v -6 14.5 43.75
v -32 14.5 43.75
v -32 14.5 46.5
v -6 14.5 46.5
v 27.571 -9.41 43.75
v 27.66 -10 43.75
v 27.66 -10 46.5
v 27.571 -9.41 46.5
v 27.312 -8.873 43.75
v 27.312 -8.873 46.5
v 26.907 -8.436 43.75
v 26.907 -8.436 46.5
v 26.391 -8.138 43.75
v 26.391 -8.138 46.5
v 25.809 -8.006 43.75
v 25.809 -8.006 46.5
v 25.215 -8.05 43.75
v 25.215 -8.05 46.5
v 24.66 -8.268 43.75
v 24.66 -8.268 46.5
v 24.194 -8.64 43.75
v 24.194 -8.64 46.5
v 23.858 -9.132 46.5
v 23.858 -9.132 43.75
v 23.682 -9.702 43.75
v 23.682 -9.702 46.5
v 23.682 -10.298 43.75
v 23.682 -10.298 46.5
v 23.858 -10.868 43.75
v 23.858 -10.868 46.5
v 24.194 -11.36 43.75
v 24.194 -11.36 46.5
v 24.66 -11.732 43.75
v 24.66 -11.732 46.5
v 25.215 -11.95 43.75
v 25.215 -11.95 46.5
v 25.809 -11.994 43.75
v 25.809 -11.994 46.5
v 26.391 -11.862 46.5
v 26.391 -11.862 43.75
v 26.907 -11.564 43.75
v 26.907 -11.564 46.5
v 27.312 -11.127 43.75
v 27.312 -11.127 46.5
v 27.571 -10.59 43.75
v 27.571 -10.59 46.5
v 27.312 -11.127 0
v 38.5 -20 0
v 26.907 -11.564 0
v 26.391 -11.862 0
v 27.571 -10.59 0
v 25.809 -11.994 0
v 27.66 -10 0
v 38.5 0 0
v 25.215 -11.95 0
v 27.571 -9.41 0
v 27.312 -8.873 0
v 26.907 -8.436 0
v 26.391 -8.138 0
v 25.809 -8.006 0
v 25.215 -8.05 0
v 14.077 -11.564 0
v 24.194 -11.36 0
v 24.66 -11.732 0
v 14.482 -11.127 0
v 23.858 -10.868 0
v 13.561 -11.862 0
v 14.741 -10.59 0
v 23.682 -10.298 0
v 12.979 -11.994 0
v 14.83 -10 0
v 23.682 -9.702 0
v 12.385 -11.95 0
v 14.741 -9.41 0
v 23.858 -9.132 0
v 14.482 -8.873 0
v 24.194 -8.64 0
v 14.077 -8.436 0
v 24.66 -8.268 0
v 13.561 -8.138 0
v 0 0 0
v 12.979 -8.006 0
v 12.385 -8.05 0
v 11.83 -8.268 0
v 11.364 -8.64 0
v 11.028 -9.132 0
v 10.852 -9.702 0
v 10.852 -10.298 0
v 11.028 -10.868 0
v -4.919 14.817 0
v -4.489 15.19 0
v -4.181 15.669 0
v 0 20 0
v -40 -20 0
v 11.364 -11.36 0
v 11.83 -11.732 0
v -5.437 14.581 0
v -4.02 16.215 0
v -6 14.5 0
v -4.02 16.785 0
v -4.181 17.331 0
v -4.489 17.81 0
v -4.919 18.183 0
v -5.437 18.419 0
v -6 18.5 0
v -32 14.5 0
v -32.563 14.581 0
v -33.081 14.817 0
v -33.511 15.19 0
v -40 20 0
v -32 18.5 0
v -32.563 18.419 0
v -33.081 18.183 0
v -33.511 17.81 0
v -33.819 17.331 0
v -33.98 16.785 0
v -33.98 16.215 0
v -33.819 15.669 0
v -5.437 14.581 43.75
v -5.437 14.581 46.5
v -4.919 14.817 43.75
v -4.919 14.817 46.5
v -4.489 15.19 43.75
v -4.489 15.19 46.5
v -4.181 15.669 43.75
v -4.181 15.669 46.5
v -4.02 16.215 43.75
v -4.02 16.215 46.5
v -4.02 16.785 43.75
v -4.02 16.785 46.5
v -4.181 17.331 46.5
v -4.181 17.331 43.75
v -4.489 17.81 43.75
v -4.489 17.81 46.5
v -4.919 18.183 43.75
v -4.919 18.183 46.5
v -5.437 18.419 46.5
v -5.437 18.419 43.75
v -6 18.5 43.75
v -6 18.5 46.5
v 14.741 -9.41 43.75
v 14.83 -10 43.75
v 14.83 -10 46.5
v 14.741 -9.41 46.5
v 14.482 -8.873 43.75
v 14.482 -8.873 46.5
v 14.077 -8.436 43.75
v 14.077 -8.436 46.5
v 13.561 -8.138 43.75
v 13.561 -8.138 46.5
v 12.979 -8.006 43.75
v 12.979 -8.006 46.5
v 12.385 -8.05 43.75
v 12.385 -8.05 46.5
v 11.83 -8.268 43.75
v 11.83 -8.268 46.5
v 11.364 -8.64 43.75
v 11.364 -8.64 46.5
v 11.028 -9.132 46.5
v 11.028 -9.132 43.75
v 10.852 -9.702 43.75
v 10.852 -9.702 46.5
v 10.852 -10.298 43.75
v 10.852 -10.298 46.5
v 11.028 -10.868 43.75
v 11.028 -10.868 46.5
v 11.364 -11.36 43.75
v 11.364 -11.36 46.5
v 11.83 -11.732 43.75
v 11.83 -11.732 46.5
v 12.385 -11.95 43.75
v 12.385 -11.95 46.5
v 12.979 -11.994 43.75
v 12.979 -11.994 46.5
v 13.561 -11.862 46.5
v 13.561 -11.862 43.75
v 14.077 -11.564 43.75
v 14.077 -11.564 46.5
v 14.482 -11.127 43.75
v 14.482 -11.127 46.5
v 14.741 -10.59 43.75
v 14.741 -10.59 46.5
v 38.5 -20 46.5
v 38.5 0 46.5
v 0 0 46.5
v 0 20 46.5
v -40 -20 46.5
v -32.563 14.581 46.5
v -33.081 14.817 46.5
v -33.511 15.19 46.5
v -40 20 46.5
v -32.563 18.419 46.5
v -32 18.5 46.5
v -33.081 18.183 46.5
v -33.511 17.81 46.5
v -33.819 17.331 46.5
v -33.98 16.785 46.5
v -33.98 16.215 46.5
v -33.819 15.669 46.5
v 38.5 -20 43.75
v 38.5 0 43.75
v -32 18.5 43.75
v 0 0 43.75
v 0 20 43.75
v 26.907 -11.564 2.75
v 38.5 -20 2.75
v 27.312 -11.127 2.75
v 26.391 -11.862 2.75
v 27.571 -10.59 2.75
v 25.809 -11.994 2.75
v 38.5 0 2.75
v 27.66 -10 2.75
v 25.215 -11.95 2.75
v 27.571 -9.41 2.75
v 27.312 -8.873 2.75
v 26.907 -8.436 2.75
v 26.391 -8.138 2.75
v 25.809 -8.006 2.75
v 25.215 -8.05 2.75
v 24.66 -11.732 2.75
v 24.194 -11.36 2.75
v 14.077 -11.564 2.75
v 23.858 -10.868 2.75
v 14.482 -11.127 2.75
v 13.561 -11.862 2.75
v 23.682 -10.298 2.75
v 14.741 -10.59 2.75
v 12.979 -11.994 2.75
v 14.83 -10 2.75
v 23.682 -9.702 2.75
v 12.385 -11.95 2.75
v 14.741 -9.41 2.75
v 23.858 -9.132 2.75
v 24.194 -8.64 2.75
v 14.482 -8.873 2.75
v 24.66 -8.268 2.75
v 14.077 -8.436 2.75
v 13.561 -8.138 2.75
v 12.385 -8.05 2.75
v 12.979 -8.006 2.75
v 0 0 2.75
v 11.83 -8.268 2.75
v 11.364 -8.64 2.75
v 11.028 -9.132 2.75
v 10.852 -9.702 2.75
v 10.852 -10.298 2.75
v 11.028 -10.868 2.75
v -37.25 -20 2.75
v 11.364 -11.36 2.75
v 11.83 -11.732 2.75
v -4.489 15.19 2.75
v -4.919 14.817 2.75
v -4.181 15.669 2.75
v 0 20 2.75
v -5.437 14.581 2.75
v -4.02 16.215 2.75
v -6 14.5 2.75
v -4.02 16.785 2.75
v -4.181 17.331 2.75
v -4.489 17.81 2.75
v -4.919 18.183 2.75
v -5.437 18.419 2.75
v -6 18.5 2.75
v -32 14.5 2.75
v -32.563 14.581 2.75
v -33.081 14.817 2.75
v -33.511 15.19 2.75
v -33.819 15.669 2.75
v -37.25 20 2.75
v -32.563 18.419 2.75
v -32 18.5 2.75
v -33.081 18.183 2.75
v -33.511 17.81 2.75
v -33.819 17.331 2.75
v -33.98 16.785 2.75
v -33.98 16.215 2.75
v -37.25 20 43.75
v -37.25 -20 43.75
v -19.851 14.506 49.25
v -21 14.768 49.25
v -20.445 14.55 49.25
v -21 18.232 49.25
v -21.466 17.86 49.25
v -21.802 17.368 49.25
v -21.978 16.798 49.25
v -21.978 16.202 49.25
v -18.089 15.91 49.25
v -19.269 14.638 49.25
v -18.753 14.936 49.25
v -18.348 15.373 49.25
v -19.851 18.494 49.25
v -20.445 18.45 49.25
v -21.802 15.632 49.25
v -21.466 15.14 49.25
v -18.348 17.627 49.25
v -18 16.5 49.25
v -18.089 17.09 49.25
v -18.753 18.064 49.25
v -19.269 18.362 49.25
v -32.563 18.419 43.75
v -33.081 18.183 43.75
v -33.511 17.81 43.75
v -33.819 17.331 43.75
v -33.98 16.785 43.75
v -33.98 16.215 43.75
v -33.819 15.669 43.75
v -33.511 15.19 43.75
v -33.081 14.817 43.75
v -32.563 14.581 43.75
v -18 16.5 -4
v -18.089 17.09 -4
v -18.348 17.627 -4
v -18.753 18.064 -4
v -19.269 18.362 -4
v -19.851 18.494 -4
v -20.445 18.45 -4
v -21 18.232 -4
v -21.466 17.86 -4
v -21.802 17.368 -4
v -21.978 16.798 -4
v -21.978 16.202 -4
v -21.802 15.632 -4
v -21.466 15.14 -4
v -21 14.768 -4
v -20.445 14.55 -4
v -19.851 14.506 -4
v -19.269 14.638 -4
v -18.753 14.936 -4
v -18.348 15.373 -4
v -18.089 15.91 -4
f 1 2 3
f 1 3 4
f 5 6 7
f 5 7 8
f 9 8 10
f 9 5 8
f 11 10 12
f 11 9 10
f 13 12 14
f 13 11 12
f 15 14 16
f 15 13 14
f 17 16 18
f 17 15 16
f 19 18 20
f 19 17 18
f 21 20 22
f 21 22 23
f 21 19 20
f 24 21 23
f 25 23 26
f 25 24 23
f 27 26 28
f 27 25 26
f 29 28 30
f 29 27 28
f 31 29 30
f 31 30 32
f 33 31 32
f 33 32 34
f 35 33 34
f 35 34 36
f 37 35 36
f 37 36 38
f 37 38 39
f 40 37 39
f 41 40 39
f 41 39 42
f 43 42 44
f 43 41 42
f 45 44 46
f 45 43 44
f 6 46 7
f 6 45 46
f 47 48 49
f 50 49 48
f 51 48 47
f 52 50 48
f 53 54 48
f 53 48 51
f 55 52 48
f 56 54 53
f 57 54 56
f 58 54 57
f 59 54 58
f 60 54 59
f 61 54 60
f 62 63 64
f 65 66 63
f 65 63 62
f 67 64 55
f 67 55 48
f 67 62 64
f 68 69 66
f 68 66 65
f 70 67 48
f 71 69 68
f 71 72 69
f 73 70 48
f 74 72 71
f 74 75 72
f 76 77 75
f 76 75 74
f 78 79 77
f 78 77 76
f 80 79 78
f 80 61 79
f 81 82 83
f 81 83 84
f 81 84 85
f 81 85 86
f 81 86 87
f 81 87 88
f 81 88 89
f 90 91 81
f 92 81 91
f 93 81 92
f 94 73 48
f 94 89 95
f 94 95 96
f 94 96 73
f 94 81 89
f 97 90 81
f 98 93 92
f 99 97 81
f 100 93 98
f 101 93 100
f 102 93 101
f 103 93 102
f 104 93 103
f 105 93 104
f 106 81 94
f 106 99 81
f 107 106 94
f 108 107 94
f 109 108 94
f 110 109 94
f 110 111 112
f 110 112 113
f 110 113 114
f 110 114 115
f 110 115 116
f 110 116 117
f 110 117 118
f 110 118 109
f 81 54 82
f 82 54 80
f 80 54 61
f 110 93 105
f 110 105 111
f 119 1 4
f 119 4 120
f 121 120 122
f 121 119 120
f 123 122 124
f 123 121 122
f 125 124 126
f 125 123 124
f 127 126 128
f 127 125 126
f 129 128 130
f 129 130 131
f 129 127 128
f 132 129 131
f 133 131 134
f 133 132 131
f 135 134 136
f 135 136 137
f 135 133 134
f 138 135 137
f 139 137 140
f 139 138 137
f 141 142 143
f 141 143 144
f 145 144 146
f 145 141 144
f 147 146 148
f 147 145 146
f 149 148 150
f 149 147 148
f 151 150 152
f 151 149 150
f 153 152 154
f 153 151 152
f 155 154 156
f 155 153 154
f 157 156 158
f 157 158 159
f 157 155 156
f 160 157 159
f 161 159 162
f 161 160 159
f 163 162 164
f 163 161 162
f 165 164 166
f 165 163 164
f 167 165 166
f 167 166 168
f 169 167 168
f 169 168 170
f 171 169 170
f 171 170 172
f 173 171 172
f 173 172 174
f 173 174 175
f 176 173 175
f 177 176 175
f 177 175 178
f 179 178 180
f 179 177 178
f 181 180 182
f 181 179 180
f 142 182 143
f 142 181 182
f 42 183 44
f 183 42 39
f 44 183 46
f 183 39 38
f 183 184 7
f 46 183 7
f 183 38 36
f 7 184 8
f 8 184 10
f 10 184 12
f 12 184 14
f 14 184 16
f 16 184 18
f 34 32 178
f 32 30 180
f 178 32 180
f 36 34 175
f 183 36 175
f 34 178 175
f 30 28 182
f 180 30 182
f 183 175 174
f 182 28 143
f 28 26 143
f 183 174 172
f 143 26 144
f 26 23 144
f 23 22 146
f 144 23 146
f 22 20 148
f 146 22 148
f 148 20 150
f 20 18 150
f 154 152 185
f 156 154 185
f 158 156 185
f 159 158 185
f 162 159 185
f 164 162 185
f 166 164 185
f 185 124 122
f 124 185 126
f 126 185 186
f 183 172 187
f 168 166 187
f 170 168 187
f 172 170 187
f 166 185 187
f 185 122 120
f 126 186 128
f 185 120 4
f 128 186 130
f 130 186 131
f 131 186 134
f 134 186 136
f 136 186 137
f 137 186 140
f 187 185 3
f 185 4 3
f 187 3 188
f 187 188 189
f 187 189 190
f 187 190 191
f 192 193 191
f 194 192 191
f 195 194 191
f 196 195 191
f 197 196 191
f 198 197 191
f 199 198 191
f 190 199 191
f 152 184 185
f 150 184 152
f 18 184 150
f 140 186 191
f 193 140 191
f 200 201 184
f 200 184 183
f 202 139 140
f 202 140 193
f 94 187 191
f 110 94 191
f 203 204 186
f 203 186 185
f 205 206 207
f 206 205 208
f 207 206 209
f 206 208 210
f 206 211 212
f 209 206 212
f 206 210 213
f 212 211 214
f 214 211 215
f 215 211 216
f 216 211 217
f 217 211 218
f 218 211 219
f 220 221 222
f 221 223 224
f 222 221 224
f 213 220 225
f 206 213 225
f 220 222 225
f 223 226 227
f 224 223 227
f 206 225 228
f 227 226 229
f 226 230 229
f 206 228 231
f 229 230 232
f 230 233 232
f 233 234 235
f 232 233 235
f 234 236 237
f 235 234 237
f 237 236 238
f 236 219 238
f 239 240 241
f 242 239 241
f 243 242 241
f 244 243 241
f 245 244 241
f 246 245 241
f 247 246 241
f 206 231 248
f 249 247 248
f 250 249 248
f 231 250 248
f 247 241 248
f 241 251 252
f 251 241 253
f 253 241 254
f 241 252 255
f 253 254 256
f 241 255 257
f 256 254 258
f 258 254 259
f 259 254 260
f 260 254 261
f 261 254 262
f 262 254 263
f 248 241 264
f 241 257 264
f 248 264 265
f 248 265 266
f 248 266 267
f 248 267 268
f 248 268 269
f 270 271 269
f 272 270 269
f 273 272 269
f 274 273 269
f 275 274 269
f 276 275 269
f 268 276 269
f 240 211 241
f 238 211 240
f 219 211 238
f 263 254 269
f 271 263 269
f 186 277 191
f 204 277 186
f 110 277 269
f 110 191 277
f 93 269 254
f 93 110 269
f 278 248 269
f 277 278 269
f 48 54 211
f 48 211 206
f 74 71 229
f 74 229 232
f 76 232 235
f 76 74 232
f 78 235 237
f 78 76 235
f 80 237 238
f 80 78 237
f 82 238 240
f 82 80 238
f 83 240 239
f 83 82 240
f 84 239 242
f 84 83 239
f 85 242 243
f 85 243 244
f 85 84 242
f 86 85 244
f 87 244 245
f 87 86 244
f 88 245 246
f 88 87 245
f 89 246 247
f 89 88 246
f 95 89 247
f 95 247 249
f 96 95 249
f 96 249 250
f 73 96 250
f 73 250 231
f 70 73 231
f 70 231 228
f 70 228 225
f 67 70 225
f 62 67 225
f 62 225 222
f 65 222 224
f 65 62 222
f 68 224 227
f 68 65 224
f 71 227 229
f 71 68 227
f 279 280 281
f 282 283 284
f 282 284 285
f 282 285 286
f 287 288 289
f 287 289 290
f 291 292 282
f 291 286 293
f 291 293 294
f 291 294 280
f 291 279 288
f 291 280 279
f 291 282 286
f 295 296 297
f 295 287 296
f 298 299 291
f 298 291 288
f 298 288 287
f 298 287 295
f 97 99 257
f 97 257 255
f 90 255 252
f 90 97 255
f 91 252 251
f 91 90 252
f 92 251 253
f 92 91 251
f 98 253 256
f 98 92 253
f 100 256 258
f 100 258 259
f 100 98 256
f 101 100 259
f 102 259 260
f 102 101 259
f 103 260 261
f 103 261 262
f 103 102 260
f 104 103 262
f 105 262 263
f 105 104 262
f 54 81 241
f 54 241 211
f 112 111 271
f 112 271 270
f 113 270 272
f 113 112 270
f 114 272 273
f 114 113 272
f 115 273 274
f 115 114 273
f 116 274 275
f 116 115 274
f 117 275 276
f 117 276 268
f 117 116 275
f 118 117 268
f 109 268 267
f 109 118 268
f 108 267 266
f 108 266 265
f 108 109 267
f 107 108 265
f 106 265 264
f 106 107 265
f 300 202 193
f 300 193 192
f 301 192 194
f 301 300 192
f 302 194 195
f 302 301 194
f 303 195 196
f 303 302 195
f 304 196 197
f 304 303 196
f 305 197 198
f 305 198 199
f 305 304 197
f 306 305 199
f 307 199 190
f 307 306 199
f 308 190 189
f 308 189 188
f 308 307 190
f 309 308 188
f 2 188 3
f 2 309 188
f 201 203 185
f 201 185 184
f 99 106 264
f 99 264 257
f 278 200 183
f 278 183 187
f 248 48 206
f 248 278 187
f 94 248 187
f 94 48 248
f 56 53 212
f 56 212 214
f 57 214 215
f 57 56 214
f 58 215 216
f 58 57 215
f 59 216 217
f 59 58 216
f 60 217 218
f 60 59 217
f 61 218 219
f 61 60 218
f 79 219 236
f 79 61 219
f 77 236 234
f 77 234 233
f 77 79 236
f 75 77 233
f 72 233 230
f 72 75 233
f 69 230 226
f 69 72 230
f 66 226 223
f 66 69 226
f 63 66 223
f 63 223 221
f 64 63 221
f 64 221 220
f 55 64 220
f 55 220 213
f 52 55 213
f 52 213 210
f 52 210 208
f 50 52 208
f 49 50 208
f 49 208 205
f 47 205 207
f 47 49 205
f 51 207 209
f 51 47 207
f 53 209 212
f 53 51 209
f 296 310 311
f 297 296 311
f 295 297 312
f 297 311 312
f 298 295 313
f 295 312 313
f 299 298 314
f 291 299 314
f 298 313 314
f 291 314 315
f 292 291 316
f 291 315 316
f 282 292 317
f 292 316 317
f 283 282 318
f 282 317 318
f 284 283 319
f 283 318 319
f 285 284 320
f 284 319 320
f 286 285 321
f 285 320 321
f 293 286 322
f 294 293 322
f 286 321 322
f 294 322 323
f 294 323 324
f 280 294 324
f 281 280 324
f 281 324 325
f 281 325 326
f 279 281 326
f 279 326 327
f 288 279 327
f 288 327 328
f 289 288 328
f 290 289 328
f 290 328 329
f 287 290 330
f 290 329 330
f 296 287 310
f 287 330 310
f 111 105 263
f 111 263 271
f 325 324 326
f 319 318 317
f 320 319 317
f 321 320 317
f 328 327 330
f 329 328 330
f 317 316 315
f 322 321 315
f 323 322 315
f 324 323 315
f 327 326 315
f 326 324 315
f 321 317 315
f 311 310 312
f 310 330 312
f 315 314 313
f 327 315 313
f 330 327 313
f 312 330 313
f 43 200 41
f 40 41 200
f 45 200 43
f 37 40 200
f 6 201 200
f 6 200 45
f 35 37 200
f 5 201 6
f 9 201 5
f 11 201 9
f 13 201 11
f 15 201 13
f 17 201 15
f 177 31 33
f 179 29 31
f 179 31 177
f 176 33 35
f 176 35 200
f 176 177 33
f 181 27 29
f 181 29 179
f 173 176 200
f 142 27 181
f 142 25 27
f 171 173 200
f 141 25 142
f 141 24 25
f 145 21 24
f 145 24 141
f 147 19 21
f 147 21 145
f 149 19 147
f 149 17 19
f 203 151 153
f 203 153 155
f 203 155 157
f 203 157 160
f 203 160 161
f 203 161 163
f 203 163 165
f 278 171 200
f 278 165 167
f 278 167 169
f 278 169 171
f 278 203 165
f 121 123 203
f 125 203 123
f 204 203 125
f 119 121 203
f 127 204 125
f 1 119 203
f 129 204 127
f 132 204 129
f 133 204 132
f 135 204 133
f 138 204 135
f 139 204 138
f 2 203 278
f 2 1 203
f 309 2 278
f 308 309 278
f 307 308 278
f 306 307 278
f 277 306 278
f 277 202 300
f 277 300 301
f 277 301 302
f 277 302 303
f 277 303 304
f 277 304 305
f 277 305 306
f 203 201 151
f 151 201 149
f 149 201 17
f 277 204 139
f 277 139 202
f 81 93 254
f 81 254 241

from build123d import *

# Parameters (mm, degrees)
SKETCH1_R           = 2
BOSS_EXTRUDE1_DEPTH = 2.75
BOSS_EXTRUDE2_START = -4
SKETCH1_4_R         = 2
BOSS_EXTRUDE2_DEPTH = 53.25
SKETCH2_W           = 2.75
SKETCH2_H           = 40
BOSS_EXTRUDE3_DEPTH = 43.75
LPATTERN1_COUNT     = 2
LPATTERN1_PITCH     = 43.75


with BuildPart() as part:
    # Sketch1 → Boss-Extrude1 (new body)
    with BuildSketch(Plane.XY):
        Polygon((38.5, 0), (0, 0), (0, 20), (-40, 20), (-40, -20), (38.5, -20), align=None)
        with Locations((12.83, -10)):
            Circle(SKETCH1_R, mode=Mode.SUBTRACT)
        with Locations((25.66, -10)):
            Circle(SKETCH1_R, mode=Mode.SUBTRACT)
        with BuildLine():
            ThreePointArc((-32, 14.5), (-34, 16.5), (-32, 18.5))
            Line((-32, 18.5), (-20, 18.5))
            Line((-20, 18.5), (-6, 18.5))
            ThreePointArc((-6, 18.5), (-4, 16.5), (-6, 14.5))
            Line((-6, 14.5), (-20, 14.5))
            Line((-20, 14.5), (-32, 14.5))
        make_face(mode=Mode.SUBTRACT)
    boss_extrude1 = extrude(amount=BOSS_EXTRUDE1_DEPTH)

    # Sketch2 → Boss-Extrude3 (add)
    with BuildSketch(Plane.XY.offset(2.75)):
        with Locations((-38.625, 0)):
            Rectangle(SKETCH2_W, SKETCH2_H)
    extrude(amount=BOSS_EXTRUDE3_DEPTH)

    # LPattern1: Boss-Extrude1 ×2
    with Locations(*[(0, 0, i * LPATTERN1_PITCH) for i in range(1, LPATTERN1_COUNT)]):
        add(boss_extrude1)


with BuildPart() as body_2:
    # Sketch1<4> → Boss-Extrude2 (new body)
    with BuildSketch(Plane.XY.offset(BOSS_EXTRUDE2_START)):
        with Locations((-20, 16.5)):
            Circle(SKETCH1_4_R)
    extrude(amount=BOSS_EXTRUDE2_DEPTH)


solid = Compound([part.part, body_2.part])
